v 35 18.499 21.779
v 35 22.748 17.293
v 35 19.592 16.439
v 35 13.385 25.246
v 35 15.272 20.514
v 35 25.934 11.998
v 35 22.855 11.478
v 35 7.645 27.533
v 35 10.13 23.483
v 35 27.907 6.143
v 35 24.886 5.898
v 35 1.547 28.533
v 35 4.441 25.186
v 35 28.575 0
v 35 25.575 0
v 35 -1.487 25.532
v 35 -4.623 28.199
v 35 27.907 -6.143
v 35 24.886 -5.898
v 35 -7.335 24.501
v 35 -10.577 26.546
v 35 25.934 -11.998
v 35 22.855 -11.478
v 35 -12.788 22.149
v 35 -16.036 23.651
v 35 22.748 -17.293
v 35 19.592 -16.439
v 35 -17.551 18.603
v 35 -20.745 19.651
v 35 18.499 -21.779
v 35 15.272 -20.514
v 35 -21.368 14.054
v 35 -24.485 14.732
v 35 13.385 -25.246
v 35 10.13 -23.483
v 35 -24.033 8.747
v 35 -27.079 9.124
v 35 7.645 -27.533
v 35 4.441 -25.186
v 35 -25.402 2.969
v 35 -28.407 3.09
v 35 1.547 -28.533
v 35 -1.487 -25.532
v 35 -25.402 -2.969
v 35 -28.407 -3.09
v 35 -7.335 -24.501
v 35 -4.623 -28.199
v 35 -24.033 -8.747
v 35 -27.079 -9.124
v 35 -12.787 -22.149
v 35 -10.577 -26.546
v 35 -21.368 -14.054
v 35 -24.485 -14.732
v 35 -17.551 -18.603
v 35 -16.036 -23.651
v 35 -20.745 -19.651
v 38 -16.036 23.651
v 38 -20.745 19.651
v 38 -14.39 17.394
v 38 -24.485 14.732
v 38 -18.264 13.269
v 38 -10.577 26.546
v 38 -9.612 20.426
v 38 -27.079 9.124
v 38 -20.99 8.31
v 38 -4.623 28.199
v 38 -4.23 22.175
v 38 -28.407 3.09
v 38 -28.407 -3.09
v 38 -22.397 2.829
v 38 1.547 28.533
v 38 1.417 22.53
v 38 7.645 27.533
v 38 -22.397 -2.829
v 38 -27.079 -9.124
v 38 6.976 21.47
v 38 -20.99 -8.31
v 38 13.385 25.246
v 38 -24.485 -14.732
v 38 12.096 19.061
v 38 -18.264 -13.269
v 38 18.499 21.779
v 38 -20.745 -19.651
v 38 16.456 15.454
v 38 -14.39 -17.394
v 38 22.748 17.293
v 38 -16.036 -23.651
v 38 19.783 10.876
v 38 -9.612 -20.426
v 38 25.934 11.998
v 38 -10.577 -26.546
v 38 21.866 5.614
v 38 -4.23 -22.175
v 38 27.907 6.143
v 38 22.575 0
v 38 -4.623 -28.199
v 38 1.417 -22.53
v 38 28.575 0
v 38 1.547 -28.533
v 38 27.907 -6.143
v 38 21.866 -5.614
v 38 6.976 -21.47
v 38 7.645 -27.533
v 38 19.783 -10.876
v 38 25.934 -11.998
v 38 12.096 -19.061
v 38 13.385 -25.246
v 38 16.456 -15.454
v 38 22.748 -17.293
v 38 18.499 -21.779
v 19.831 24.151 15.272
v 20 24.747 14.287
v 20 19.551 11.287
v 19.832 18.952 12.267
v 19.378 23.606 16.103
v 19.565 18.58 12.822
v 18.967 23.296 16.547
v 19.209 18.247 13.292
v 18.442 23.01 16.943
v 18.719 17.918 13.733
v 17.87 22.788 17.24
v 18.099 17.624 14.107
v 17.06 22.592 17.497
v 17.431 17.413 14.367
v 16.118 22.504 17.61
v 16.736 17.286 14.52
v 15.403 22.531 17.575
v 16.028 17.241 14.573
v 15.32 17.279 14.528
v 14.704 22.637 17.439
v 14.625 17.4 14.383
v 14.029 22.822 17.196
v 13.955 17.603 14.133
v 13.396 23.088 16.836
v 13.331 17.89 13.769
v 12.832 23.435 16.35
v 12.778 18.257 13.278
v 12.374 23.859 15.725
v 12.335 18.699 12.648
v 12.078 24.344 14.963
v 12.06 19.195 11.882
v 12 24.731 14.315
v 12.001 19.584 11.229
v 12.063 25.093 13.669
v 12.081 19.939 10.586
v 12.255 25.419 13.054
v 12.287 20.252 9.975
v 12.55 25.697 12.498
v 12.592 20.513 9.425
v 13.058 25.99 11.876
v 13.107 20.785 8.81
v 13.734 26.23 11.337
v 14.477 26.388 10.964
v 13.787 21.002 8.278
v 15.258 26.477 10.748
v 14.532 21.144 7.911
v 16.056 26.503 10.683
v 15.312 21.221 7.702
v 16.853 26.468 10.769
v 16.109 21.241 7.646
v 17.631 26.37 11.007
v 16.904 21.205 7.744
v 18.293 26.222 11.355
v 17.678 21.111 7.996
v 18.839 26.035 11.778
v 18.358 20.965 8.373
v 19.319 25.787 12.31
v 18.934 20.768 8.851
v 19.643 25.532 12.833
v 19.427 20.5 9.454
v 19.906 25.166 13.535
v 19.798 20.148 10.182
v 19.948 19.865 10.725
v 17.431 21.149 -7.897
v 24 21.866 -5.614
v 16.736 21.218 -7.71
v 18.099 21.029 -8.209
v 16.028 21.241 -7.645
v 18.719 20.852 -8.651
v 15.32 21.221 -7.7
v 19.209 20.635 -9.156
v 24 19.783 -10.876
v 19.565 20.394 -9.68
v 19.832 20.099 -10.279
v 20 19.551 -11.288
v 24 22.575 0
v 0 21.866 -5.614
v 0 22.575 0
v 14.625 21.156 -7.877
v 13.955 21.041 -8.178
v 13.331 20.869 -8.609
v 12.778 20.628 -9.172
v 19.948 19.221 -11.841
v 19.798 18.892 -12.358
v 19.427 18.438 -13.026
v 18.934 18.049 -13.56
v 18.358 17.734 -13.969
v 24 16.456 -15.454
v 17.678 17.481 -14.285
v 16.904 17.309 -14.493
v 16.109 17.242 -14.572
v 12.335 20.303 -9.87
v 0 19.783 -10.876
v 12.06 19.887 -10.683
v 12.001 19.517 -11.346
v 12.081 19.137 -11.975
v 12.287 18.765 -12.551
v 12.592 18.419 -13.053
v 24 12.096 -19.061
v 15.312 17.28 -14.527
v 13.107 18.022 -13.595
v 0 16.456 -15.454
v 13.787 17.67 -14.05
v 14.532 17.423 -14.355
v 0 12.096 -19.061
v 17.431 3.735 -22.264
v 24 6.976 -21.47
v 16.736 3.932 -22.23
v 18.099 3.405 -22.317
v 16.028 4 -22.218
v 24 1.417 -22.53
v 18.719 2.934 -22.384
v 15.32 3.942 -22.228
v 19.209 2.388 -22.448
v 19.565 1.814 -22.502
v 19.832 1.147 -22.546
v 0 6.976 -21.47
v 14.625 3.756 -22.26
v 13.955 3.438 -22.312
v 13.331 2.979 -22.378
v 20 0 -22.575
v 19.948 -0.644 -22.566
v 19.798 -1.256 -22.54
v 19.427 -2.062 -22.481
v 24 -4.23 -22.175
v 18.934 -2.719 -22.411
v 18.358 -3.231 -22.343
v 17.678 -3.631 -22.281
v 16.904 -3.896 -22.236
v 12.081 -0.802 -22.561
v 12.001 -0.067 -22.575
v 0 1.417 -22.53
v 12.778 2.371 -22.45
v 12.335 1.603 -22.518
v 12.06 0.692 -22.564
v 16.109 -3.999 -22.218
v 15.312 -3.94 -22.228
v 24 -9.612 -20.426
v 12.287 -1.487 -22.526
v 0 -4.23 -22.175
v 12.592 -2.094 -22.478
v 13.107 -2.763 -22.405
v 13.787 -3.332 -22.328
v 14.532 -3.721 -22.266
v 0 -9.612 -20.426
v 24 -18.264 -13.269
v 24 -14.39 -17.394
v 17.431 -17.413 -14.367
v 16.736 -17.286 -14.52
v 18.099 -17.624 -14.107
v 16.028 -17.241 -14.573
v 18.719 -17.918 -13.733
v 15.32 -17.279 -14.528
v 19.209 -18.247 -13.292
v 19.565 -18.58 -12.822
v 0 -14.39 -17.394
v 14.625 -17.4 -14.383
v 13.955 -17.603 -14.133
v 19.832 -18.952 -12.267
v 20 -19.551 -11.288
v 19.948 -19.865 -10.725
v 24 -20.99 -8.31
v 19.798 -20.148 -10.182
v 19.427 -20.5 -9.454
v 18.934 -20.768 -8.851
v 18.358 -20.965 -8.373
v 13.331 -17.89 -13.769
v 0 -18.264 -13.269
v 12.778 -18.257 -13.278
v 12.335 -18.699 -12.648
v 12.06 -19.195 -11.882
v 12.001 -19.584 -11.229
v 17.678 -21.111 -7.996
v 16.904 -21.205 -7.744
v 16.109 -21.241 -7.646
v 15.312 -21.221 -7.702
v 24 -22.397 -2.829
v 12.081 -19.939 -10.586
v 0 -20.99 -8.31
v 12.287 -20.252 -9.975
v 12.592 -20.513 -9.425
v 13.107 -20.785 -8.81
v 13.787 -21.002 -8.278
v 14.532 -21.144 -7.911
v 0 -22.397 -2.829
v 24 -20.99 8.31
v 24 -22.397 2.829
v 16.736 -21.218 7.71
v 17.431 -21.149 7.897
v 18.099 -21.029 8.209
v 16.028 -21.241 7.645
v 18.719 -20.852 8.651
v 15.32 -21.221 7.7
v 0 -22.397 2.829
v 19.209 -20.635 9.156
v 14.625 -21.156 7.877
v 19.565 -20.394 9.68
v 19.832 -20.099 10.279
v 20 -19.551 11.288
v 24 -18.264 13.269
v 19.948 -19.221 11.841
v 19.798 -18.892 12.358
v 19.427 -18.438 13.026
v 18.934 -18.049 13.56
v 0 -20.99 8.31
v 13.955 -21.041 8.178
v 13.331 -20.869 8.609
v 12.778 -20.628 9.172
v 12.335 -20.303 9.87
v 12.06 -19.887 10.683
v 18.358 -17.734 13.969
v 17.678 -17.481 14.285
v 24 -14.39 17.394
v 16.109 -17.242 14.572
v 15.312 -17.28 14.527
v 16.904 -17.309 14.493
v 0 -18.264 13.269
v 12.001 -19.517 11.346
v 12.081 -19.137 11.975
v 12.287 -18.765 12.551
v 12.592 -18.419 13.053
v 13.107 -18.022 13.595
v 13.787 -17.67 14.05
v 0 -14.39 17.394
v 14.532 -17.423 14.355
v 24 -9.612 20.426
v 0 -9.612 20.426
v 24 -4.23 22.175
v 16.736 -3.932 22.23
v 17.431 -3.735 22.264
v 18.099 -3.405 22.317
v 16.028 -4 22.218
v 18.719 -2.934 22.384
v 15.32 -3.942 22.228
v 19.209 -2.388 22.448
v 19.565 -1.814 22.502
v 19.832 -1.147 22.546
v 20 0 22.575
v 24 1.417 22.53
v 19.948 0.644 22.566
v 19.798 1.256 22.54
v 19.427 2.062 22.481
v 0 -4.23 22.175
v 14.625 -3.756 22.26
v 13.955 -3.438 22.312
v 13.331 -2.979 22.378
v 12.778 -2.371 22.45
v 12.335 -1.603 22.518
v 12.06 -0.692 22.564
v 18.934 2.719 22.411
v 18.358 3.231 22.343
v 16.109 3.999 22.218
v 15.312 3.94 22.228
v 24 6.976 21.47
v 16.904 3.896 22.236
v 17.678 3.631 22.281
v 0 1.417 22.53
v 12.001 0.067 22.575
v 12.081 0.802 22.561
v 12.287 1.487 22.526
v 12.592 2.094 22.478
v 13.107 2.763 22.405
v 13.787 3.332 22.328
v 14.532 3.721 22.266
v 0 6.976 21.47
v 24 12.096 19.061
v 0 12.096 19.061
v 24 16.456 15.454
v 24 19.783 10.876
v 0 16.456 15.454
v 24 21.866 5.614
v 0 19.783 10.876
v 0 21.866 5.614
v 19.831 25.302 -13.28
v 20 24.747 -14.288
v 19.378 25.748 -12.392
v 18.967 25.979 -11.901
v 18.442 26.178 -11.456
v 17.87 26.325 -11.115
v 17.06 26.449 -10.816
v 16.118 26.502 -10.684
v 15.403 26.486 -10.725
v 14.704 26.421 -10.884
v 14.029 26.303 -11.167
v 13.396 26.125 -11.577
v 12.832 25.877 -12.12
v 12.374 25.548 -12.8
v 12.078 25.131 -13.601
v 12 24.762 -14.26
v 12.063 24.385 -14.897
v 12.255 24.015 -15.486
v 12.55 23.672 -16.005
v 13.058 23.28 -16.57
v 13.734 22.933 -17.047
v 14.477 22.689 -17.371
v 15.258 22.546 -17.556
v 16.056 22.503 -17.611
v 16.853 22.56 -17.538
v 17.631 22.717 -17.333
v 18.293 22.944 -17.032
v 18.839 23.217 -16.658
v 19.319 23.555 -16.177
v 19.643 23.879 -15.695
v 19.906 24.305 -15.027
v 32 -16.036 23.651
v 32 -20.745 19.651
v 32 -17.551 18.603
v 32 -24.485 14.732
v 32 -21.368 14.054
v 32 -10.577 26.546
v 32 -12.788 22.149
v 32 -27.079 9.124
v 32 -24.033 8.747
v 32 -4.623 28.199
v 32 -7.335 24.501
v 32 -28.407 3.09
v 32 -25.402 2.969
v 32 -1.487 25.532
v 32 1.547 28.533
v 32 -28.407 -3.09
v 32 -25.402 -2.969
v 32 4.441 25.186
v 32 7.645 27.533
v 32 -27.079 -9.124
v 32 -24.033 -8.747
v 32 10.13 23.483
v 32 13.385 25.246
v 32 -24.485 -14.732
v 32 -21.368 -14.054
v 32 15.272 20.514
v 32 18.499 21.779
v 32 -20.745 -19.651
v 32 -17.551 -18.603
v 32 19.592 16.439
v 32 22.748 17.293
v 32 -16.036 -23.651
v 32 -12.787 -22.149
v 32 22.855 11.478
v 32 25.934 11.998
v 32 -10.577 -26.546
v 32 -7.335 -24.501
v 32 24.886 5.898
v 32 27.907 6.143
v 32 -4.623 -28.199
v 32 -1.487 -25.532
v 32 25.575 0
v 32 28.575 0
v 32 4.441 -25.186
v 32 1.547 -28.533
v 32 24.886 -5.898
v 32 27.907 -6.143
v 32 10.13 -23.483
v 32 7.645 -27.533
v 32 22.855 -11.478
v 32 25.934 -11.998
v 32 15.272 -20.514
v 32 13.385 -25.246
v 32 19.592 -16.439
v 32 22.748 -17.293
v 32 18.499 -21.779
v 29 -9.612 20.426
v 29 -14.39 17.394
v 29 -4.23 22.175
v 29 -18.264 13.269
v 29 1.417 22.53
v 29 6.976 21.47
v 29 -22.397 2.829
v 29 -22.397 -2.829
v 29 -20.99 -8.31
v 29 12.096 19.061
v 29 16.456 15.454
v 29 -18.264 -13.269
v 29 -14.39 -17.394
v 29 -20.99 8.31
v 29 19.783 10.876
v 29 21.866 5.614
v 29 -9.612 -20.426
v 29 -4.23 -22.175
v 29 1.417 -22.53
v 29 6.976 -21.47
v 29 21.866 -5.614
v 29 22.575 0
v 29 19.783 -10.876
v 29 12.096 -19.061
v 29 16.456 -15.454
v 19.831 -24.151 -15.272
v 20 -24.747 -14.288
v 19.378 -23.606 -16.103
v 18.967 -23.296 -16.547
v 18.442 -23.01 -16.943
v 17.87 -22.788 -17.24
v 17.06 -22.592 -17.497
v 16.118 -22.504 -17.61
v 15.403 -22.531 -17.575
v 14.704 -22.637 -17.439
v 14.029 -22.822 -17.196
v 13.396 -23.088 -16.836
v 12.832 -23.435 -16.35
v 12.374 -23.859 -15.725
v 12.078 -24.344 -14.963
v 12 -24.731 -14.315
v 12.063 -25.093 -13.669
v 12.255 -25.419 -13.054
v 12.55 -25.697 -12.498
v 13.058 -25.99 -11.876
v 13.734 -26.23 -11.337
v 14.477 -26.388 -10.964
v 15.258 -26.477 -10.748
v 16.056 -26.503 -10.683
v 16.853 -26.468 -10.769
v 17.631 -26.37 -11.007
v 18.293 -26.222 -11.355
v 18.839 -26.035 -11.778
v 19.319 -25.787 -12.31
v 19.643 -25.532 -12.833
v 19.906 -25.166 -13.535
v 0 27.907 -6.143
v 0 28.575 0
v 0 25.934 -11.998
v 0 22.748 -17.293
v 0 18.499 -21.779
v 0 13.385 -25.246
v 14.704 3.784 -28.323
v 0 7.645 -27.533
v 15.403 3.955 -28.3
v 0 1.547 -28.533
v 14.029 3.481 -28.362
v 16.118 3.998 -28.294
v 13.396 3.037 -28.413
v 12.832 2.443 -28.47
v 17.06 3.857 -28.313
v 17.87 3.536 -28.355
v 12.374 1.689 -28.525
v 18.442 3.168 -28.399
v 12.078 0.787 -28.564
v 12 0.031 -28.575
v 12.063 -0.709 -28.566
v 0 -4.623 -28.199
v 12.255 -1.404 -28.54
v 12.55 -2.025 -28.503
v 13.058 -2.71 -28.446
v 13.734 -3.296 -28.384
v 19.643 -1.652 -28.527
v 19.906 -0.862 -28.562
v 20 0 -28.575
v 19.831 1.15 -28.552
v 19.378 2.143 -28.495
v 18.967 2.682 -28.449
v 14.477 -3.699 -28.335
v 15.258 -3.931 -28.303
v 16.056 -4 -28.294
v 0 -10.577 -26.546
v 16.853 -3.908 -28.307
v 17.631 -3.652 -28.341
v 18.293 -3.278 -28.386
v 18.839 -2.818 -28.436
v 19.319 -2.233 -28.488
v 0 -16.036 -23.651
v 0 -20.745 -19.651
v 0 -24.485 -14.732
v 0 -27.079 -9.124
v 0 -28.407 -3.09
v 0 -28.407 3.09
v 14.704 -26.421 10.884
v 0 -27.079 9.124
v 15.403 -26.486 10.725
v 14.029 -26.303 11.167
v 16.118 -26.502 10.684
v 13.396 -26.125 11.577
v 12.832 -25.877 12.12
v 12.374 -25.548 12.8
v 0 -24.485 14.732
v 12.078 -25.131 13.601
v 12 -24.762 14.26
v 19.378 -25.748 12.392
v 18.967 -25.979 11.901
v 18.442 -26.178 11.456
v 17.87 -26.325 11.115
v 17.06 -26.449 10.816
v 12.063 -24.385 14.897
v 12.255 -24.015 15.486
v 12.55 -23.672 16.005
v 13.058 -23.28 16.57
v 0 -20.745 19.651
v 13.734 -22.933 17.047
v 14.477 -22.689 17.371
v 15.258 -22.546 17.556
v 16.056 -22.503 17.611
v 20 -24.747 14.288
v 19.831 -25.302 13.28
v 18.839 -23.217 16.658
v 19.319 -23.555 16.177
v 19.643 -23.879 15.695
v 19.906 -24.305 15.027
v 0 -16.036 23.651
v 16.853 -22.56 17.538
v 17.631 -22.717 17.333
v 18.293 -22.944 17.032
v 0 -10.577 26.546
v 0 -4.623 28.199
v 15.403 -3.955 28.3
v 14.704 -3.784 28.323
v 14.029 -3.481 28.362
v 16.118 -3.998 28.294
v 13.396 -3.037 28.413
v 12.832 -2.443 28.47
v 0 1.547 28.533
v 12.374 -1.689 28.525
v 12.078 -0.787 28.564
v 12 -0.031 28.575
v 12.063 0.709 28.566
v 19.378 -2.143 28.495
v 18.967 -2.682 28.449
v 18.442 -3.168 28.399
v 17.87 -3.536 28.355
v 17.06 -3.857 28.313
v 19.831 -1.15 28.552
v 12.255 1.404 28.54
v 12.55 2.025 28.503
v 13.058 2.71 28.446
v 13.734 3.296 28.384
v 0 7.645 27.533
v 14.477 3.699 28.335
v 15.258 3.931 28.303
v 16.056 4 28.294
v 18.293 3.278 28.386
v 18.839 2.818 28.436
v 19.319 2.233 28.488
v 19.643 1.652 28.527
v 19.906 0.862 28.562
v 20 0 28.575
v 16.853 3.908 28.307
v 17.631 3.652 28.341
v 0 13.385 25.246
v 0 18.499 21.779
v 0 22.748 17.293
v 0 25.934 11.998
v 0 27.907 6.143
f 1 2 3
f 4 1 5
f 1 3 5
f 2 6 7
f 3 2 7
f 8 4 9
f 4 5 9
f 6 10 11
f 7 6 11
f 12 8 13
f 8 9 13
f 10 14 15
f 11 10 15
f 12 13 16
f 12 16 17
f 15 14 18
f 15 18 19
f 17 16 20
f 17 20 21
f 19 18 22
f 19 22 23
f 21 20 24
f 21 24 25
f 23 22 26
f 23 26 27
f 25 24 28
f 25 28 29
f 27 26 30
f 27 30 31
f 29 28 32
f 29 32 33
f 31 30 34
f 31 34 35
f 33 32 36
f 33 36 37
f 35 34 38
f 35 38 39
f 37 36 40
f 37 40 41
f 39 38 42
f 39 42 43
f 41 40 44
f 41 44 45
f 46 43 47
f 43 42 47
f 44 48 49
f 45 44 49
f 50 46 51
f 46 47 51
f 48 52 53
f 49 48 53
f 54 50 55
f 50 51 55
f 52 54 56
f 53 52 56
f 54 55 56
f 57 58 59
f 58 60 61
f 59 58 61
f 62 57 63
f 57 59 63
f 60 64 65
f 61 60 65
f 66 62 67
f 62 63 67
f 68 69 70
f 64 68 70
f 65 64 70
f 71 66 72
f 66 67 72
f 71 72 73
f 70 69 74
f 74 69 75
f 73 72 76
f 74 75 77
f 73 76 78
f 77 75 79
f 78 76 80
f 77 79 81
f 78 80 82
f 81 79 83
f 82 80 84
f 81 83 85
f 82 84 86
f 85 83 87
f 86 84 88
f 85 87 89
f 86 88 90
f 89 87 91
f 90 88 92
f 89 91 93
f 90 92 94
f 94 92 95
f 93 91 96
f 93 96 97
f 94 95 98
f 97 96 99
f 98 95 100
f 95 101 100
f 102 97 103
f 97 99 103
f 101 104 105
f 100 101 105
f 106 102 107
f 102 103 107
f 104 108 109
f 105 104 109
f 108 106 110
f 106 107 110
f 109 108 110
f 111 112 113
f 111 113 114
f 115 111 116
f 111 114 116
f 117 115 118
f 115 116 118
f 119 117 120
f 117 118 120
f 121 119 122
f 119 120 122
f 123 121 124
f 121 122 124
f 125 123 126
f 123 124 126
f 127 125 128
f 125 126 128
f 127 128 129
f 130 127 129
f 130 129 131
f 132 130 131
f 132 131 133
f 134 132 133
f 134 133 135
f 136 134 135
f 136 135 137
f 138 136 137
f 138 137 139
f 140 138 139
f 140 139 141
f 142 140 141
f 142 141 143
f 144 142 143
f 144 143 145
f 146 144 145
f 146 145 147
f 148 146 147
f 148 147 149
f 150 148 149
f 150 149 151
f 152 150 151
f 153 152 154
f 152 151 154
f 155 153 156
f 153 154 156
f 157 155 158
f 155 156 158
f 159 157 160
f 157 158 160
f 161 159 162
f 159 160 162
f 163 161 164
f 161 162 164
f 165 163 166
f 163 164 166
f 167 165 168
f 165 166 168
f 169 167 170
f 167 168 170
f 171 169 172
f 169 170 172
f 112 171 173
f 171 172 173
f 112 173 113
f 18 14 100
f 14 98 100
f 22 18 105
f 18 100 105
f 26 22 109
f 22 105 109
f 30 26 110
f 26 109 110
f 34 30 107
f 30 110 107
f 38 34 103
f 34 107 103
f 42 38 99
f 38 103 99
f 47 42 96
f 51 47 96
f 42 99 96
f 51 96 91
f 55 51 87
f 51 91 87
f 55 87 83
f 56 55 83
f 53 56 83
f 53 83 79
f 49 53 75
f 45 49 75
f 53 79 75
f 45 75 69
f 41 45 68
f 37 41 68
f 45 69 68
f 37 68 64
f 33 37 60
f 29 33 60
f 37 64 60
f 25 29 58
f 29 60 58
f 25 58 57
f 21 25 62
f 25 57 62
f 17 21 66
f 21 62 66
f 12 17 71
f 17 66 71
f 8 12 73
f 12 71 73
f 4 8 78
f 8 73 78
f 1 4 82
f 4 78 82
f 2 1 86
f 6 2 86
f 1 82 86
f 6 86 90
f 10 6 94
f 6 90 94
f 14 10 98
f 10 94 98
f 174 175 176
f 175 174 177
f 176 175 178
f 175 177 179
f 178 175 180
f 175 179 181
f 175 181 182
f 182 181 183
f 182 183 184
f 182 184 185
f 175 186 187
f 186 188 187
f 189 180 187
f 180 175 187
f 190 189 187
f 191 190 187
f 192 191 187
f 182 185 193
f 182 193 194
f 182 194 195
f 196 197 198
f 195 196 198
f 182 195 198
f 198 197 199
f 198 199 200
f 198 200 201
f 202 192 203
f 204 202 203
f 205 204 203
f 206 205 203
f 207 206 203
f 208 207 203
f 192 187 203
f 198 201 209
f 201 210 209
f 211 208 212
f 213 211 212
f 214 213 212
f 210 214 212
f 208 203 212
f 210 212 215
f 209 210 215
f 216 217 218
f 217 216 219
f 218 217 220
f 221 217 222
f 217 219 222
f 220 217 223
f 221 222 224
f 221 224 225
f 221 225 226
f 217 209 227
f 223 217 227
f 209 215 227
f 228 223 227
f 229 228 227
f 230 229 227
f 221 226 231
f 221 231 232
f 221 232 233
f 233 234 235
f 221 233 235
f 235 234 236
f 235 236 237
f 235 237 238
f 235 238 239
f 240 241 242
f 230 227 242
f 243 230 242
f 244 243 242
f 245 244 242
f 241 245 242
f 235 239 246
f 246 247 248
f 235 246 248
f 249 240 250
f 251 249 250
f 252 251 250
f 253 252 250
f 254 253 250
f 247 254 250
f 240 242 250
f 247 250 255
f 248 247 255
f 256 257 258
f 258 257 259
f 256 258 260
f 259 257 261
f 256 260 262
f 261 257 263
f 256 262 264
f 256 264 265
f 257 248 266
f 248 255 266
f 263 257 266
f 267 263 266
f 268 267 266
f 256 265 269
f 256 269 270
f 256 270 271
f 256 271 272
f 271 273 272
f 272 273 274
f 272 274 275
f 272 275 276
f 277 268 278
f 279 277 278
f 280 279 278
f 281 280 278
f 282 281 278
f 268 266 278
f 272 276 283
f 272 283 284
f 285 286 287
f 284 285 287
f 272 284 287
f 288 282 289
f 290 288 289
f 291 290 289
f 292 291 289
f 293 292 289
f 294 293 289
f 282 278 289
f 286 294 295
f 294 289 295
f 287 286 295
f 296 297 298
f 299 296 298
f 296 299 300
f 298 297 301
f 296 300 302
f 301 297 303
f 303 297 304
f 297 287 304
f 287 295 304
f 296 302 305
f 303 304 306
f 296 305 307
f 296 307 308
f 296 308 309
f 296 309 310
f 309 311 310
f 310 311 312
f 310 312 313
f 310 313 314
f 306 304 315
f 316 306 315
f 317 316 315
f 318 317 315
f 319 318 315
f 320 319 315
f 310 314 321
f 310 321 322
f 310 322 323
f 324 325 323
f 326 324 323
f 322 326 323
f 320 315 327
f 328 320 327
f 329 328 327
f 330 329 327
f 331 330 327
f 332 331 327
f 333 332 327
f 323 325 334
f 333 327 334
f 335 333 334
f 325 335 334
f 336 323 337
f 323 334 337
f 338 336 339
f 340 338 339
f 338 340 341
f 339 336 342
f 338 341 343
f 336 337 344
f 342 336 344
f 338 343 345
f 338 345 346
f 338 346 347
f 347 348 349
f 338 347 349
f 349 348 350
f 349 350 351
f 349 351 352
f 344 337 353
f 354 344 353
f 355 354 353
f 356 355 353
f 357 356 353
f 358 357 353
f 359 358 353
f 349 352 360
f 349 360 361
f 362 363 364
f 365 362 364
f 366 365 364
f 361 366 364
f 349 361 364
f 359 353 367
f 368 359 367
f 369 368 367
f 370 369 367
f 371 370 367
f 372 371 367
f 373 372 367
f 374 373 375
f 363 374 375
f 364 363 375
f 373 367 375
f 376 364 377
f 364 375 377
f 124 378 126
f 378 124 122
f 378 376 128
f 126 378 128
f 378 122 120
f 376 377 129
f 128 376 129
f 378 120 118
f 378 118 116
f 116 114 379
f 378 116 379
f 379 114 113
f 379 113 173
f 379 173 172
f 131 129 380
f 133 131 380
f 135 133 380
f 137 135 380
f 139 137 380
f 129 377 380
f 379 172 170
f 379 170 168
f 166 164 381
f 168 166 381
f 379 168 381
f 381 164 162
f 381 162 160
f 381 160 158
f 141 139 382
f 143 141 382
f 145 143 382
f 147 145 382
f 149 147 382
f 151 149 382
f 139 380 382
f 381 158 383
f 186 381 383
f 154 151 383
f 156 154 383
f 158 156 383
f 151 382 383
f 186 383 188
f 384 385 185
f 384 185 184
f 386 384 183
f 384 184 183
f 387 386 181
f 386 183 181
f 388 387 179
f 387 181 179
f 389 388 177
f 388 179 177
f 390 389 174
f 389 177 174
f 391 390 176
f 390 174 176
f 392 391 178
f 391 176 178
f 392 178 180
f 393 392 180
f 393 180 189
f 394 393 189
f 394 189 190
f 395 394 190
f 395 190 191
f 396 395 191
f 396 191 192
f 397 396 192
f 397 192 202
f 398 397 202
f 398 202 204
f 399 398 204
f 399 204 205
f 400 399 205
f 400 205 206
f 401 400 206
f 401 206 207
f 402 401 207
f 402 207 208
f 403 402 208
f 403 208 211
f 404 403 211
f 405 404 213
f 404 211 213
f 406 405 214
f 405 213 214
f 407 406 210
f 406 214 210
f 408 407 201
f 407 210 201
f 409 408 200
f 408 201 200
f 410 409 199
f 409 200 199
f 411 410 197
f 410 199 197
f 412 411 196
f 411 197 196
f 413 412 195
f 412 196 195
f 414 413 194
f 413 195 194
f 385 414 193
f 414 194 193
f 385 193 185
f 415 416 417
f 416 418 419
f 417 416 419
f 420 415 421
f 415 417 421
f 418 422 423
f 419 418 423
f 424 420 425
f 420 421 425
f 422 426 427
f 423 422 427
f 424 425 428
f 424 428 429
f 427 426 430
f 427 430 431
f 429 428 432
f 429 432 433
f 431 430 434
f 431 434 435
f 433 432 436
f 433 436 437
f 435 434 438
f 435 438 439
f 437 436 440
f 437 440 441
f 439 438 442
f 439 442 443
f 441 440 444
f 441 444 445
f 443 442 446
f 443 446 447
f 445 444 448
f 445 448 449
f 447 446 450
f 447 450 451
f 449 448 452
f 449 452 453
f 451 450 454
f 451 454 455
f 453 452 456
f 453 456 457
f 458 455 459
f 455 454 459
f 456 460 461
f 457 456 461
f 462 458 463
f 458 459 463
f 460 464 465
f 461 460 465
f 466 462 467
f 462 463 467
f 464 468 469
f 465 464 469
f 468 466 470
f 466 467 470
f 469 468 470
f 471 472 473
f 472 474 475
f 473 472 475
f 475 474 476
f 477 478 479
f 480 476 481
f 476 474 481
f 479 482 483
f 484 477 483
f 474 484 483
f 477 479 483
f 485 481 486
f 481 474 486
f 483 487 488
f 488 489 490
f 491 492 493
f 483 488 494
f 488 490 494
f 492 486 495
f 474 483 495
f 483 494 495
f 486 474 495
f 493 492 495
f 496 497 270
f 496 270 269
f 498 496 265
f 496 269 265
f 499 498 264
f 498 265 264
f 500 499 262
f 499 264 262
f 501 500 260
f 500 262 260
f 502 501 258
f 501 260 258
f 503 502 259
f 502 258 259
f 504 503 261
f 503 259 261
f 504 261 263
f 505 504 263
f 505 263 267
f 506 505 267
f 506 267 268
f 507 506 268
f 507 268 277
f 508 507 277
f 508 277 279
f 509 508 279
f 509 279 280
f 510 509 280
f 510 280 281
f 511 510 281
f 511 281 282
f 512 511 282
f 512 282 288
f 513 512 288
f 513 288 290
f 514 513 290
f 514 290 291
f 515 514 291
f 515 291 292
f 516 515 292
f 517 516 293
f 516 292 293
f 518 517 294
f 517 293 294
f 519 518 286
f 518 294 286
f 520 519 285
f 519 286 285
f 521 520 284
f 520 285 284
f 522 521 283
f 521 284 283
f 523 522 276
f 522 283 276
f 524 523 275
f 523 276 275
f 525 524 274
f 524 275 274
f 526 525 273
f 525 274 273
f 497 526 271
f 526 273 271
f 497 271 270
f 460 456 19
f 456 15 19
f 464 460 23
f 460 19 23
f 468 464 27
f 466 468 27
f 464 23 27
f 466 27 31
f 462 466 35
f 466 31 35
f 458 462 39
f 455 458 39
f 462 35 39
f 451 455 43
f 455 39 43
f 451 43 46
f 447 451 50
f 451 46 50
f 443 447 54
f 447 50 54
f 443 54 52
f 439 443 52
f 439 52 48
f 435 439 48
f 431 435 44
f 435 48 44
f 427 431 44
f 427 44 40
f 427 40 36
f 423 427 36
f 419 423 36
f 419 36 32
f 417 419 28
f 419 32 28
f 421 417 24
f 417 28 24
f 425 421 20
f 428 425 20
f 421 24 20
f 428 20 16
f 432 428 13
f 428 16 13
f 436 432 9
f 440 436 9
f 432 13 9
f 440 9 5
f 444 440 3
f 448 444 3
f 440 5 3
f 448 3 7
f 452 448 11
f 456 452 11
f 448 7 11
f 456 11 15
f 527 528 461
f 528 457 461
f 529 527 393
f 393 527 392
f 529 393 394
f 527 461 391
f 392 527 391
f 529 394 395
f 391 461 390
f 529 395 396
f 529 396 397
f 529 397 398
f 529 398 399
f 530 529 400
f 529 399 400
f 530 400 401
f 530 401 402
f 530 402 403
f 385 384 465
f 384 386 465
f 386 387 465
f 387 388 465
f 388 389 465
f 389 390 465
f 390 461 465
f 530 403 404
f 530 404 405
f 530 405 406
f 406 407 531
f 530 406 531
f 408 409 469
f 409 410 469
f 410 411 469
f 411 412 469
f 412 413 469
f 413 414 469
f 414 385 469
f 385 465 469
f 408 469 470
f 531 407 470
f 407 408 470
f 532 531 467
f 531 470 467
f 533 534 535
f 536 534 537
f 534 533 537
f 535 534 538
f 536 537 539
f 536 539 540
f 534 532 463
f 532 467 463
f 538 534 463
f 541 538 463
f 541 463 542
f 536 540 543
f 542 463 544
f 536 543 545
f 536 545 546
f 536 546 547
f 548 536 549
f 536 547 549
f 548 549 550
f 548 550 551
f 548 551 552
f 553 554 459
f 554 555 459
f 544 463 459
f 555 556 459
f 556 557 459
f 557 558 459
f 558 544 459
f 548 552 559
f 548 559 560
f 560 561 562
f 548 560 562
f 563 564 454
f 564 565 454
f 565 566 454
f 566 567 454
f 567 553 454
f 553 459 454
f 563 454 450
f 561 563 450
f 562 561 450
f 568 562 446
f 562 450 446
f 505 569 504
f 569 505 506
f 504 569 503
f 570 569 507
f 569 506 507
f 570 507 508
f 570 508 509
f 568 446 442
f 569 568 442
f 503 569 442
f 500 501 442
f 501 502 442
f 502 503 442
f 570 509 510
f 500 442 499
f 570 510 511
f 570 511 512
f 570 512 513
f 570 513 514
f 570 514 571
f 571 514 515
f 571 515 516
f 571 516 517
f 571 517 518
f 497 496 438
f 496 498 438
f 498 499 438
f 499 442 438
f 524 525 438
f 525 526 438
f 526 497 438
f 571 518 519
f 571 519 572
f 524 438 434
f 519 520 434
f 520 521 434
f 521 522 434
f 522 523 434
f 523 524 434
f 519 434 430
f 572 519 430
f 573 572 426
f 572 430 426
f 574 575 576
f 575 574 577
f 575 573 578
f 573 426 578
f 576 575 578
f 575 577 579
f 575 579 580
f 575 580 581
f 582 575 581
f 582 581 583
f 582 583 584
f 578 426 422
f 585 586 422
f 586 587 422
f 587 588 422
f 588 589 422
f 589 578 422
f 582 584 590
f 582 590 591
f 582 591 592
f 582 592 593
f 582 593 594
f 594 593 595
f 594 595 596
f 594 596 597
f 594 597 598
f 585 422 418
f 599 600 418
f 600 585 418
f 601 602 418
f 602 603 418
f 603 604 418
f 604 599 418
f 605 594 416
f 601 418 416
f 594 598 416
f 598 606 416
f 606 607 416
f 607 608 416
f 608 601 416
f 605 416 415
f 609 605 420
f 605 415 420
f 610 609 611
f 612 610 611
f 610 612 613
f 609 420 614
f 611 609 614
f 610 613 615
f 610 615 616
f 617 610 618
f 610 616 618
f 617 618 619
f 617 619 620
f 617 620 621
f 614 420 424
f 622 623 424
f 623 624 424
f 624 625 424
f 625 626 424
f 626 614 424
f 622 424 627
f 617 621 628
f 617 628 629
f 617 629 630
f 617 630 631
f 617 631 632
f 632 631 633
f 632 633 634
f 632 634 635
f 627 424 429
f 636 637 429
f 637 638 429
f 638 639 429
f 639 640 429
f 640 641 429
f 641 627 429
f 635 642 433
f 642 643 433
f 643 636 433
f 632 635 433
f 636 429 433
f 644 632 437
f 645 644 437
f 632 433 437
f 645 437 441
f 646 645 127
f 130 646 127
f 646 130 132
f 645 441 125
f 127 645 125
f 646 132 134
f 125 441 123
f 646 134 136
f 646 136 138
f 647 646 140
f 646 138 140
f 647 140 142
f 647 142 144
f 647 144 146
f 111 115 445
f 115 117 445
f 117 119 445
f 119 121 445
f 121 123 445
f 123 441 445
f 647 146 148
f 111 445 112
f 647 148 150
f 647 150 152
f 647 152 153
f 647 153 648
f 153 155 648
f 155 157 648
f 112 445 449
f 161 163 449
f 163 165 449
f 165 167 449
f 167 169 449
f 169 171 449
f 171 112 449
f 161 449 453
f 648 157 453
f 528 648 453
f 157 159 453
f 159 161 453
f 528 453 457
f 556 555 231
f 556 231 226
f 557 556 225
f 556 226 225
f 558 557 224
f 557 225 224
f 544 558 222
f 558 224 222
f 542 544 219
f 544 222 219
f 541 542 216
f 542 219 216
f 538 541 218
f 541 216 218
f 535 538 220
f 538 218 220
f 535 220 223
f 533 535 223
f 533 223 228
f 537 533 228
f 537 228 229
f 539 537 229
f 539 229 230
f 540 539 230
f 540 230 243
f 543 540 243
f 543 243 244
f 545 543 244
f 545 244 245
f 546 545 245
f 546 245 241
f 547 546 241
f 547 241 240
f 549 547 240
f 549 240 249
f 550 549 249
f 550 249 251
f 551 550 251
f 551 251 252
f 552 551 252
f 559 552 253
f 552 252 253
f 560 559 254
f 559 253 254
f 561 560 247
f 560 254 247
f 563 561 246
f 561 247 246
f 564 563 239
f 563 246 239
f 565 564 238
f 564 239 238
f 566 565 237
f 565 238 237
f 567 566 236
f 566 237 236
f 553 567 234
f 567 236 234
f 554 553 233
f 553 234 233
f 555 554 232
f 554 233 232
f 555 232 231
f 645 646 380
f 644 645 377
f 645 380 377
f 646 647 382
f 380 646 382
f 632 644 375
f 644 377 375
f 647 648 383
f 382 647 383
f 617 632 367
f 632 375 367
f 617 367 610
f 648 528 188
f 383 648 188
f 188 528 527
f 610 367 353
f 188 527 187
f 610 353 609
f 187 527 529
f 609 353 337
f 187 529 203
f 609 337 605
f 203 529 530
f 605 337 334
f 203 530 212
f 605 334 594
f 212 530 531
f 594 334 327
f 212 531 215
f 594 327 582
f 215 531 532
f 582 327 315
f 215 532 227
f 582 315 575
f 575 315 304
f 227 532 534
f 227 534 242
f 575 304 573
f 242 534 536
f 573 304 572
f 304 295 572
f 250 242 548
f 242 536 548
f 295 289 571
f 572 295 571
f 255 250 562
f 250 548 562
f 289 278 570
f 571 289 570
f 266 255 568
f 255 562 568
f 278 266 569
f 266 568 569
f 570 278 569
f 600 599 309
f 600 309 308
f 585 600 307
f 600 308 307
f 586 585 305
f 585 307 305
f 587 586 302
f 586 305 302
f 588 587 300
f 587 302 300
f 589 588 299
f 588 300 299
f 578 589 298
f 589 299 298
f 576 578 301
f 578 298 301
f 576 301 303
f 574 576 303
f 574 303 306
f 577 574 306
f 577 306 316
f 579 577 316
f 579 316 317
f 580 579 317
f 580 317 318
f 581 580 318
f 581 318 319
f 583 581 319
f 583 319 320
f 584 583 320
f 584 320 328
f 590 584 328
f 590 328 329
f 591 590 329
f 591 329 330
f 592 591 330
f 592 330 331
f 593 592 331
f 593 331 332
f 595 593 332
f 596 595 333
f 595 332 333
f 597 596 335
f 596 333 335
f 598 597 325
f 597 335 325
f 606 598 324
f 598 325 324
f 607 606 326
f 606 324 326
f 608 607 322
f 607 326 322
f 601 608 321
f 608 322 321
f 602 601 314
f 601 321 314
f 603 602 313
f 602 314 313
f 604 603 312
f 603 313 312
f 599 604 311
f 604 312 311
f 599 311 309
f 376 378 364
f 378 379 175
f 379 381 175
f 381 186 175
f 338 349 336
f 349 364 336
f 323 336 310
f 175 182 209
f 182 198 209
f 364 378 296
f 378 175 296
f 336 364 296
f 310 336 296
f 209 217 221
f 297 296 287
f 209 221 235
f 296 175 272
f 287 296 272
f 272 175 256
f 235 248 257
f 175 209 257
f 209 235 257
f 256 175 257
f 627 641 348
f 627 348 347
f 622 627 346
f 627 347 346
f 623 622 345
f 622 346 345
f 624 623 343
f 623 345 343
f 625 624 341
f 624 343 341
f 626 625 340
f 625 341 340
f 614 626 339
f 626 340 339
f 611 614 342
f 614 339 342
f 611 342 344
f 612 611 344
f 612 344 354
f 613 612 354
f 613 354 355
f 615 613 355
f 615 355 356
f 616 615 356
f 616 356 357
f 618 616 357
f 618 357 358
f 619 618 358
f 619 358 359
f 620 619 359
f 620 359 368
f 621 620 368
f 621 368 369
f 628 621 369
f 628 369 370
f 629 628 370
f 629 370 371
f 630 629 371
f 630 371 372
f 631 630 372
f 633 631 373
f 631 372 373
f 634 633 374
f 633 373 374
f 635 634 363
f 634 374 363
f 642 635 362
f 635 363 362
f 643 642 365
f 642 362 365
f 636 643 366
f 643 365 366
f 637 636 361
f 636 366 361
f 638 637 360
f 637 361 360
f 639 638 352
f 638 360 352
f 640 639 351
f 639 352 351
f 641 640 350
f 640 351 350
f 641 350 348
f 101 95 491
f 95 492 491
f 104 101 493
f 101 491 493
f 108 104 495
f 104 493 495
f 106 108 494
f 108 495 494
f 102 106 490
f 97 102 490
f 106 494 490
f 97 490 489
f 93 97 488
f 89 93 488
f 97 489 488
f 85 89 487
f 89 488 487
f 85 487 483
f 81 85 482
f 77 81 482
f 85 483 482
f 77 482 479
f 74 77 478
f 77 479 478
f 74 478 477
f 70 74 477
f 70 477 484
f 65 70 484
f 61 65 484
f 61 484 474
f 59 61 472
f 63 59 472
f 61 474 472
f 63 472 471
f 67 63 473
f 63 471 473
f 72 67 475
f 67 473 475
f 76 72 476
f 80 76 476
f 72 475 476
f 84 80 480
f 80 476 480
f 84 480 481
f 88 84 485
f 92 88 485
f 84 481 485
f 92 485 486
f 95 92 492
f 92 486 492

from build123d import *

# Parameters (mm, degrees)
ESBO_O2_R             = 4
CORTE_EXTRUS_O1_DEPTH = 60
PADR_OCIRCULAR1_COUNT = 6


with BuildPart() as part:
    # Esboço1 → Revolução1 (revolve)
    with BuildSketch(Plane.XY):
        Polygon((35, 28.575), (38, 28.575), (38, 22.575), (29, 22.575), (29, 0), (24, 0), (24, 22.575), (0, 22.575), (0, 28.575), (32, 28.575), (32, 25.575), (35, 25.575), align=None)
    revolve(axis=Axis((0, 0, 0), (-1, 0, 0)))

    # Esboço2 → Corte-extrusão1 (cut)
    with BuildSketch(Plane.XY):
        with Locations((16, 0)):
            Circle(ESBO_O2_R)
    corte_extrus_o1 = extrude(amount=-CORTE_EXTRUS_O1_DEPTH, mode=Mode.SUBTRACT)

    # PadrãoCircular1: Corte-extrusão1 ×6 about axis
    padr_ocircular1_axis = Axis((0, 0, 0), (1, 0, 0))
    for i in range(1, PADR_OCIRCULAR1_COUNT):
        add(corte_extrus_o1.rotate(padr_ocircular1_axis, i * 360 / PADR_OCIRCULAR1_COUNT), mode=Mode.SUBTRACT)


solid = part.part
